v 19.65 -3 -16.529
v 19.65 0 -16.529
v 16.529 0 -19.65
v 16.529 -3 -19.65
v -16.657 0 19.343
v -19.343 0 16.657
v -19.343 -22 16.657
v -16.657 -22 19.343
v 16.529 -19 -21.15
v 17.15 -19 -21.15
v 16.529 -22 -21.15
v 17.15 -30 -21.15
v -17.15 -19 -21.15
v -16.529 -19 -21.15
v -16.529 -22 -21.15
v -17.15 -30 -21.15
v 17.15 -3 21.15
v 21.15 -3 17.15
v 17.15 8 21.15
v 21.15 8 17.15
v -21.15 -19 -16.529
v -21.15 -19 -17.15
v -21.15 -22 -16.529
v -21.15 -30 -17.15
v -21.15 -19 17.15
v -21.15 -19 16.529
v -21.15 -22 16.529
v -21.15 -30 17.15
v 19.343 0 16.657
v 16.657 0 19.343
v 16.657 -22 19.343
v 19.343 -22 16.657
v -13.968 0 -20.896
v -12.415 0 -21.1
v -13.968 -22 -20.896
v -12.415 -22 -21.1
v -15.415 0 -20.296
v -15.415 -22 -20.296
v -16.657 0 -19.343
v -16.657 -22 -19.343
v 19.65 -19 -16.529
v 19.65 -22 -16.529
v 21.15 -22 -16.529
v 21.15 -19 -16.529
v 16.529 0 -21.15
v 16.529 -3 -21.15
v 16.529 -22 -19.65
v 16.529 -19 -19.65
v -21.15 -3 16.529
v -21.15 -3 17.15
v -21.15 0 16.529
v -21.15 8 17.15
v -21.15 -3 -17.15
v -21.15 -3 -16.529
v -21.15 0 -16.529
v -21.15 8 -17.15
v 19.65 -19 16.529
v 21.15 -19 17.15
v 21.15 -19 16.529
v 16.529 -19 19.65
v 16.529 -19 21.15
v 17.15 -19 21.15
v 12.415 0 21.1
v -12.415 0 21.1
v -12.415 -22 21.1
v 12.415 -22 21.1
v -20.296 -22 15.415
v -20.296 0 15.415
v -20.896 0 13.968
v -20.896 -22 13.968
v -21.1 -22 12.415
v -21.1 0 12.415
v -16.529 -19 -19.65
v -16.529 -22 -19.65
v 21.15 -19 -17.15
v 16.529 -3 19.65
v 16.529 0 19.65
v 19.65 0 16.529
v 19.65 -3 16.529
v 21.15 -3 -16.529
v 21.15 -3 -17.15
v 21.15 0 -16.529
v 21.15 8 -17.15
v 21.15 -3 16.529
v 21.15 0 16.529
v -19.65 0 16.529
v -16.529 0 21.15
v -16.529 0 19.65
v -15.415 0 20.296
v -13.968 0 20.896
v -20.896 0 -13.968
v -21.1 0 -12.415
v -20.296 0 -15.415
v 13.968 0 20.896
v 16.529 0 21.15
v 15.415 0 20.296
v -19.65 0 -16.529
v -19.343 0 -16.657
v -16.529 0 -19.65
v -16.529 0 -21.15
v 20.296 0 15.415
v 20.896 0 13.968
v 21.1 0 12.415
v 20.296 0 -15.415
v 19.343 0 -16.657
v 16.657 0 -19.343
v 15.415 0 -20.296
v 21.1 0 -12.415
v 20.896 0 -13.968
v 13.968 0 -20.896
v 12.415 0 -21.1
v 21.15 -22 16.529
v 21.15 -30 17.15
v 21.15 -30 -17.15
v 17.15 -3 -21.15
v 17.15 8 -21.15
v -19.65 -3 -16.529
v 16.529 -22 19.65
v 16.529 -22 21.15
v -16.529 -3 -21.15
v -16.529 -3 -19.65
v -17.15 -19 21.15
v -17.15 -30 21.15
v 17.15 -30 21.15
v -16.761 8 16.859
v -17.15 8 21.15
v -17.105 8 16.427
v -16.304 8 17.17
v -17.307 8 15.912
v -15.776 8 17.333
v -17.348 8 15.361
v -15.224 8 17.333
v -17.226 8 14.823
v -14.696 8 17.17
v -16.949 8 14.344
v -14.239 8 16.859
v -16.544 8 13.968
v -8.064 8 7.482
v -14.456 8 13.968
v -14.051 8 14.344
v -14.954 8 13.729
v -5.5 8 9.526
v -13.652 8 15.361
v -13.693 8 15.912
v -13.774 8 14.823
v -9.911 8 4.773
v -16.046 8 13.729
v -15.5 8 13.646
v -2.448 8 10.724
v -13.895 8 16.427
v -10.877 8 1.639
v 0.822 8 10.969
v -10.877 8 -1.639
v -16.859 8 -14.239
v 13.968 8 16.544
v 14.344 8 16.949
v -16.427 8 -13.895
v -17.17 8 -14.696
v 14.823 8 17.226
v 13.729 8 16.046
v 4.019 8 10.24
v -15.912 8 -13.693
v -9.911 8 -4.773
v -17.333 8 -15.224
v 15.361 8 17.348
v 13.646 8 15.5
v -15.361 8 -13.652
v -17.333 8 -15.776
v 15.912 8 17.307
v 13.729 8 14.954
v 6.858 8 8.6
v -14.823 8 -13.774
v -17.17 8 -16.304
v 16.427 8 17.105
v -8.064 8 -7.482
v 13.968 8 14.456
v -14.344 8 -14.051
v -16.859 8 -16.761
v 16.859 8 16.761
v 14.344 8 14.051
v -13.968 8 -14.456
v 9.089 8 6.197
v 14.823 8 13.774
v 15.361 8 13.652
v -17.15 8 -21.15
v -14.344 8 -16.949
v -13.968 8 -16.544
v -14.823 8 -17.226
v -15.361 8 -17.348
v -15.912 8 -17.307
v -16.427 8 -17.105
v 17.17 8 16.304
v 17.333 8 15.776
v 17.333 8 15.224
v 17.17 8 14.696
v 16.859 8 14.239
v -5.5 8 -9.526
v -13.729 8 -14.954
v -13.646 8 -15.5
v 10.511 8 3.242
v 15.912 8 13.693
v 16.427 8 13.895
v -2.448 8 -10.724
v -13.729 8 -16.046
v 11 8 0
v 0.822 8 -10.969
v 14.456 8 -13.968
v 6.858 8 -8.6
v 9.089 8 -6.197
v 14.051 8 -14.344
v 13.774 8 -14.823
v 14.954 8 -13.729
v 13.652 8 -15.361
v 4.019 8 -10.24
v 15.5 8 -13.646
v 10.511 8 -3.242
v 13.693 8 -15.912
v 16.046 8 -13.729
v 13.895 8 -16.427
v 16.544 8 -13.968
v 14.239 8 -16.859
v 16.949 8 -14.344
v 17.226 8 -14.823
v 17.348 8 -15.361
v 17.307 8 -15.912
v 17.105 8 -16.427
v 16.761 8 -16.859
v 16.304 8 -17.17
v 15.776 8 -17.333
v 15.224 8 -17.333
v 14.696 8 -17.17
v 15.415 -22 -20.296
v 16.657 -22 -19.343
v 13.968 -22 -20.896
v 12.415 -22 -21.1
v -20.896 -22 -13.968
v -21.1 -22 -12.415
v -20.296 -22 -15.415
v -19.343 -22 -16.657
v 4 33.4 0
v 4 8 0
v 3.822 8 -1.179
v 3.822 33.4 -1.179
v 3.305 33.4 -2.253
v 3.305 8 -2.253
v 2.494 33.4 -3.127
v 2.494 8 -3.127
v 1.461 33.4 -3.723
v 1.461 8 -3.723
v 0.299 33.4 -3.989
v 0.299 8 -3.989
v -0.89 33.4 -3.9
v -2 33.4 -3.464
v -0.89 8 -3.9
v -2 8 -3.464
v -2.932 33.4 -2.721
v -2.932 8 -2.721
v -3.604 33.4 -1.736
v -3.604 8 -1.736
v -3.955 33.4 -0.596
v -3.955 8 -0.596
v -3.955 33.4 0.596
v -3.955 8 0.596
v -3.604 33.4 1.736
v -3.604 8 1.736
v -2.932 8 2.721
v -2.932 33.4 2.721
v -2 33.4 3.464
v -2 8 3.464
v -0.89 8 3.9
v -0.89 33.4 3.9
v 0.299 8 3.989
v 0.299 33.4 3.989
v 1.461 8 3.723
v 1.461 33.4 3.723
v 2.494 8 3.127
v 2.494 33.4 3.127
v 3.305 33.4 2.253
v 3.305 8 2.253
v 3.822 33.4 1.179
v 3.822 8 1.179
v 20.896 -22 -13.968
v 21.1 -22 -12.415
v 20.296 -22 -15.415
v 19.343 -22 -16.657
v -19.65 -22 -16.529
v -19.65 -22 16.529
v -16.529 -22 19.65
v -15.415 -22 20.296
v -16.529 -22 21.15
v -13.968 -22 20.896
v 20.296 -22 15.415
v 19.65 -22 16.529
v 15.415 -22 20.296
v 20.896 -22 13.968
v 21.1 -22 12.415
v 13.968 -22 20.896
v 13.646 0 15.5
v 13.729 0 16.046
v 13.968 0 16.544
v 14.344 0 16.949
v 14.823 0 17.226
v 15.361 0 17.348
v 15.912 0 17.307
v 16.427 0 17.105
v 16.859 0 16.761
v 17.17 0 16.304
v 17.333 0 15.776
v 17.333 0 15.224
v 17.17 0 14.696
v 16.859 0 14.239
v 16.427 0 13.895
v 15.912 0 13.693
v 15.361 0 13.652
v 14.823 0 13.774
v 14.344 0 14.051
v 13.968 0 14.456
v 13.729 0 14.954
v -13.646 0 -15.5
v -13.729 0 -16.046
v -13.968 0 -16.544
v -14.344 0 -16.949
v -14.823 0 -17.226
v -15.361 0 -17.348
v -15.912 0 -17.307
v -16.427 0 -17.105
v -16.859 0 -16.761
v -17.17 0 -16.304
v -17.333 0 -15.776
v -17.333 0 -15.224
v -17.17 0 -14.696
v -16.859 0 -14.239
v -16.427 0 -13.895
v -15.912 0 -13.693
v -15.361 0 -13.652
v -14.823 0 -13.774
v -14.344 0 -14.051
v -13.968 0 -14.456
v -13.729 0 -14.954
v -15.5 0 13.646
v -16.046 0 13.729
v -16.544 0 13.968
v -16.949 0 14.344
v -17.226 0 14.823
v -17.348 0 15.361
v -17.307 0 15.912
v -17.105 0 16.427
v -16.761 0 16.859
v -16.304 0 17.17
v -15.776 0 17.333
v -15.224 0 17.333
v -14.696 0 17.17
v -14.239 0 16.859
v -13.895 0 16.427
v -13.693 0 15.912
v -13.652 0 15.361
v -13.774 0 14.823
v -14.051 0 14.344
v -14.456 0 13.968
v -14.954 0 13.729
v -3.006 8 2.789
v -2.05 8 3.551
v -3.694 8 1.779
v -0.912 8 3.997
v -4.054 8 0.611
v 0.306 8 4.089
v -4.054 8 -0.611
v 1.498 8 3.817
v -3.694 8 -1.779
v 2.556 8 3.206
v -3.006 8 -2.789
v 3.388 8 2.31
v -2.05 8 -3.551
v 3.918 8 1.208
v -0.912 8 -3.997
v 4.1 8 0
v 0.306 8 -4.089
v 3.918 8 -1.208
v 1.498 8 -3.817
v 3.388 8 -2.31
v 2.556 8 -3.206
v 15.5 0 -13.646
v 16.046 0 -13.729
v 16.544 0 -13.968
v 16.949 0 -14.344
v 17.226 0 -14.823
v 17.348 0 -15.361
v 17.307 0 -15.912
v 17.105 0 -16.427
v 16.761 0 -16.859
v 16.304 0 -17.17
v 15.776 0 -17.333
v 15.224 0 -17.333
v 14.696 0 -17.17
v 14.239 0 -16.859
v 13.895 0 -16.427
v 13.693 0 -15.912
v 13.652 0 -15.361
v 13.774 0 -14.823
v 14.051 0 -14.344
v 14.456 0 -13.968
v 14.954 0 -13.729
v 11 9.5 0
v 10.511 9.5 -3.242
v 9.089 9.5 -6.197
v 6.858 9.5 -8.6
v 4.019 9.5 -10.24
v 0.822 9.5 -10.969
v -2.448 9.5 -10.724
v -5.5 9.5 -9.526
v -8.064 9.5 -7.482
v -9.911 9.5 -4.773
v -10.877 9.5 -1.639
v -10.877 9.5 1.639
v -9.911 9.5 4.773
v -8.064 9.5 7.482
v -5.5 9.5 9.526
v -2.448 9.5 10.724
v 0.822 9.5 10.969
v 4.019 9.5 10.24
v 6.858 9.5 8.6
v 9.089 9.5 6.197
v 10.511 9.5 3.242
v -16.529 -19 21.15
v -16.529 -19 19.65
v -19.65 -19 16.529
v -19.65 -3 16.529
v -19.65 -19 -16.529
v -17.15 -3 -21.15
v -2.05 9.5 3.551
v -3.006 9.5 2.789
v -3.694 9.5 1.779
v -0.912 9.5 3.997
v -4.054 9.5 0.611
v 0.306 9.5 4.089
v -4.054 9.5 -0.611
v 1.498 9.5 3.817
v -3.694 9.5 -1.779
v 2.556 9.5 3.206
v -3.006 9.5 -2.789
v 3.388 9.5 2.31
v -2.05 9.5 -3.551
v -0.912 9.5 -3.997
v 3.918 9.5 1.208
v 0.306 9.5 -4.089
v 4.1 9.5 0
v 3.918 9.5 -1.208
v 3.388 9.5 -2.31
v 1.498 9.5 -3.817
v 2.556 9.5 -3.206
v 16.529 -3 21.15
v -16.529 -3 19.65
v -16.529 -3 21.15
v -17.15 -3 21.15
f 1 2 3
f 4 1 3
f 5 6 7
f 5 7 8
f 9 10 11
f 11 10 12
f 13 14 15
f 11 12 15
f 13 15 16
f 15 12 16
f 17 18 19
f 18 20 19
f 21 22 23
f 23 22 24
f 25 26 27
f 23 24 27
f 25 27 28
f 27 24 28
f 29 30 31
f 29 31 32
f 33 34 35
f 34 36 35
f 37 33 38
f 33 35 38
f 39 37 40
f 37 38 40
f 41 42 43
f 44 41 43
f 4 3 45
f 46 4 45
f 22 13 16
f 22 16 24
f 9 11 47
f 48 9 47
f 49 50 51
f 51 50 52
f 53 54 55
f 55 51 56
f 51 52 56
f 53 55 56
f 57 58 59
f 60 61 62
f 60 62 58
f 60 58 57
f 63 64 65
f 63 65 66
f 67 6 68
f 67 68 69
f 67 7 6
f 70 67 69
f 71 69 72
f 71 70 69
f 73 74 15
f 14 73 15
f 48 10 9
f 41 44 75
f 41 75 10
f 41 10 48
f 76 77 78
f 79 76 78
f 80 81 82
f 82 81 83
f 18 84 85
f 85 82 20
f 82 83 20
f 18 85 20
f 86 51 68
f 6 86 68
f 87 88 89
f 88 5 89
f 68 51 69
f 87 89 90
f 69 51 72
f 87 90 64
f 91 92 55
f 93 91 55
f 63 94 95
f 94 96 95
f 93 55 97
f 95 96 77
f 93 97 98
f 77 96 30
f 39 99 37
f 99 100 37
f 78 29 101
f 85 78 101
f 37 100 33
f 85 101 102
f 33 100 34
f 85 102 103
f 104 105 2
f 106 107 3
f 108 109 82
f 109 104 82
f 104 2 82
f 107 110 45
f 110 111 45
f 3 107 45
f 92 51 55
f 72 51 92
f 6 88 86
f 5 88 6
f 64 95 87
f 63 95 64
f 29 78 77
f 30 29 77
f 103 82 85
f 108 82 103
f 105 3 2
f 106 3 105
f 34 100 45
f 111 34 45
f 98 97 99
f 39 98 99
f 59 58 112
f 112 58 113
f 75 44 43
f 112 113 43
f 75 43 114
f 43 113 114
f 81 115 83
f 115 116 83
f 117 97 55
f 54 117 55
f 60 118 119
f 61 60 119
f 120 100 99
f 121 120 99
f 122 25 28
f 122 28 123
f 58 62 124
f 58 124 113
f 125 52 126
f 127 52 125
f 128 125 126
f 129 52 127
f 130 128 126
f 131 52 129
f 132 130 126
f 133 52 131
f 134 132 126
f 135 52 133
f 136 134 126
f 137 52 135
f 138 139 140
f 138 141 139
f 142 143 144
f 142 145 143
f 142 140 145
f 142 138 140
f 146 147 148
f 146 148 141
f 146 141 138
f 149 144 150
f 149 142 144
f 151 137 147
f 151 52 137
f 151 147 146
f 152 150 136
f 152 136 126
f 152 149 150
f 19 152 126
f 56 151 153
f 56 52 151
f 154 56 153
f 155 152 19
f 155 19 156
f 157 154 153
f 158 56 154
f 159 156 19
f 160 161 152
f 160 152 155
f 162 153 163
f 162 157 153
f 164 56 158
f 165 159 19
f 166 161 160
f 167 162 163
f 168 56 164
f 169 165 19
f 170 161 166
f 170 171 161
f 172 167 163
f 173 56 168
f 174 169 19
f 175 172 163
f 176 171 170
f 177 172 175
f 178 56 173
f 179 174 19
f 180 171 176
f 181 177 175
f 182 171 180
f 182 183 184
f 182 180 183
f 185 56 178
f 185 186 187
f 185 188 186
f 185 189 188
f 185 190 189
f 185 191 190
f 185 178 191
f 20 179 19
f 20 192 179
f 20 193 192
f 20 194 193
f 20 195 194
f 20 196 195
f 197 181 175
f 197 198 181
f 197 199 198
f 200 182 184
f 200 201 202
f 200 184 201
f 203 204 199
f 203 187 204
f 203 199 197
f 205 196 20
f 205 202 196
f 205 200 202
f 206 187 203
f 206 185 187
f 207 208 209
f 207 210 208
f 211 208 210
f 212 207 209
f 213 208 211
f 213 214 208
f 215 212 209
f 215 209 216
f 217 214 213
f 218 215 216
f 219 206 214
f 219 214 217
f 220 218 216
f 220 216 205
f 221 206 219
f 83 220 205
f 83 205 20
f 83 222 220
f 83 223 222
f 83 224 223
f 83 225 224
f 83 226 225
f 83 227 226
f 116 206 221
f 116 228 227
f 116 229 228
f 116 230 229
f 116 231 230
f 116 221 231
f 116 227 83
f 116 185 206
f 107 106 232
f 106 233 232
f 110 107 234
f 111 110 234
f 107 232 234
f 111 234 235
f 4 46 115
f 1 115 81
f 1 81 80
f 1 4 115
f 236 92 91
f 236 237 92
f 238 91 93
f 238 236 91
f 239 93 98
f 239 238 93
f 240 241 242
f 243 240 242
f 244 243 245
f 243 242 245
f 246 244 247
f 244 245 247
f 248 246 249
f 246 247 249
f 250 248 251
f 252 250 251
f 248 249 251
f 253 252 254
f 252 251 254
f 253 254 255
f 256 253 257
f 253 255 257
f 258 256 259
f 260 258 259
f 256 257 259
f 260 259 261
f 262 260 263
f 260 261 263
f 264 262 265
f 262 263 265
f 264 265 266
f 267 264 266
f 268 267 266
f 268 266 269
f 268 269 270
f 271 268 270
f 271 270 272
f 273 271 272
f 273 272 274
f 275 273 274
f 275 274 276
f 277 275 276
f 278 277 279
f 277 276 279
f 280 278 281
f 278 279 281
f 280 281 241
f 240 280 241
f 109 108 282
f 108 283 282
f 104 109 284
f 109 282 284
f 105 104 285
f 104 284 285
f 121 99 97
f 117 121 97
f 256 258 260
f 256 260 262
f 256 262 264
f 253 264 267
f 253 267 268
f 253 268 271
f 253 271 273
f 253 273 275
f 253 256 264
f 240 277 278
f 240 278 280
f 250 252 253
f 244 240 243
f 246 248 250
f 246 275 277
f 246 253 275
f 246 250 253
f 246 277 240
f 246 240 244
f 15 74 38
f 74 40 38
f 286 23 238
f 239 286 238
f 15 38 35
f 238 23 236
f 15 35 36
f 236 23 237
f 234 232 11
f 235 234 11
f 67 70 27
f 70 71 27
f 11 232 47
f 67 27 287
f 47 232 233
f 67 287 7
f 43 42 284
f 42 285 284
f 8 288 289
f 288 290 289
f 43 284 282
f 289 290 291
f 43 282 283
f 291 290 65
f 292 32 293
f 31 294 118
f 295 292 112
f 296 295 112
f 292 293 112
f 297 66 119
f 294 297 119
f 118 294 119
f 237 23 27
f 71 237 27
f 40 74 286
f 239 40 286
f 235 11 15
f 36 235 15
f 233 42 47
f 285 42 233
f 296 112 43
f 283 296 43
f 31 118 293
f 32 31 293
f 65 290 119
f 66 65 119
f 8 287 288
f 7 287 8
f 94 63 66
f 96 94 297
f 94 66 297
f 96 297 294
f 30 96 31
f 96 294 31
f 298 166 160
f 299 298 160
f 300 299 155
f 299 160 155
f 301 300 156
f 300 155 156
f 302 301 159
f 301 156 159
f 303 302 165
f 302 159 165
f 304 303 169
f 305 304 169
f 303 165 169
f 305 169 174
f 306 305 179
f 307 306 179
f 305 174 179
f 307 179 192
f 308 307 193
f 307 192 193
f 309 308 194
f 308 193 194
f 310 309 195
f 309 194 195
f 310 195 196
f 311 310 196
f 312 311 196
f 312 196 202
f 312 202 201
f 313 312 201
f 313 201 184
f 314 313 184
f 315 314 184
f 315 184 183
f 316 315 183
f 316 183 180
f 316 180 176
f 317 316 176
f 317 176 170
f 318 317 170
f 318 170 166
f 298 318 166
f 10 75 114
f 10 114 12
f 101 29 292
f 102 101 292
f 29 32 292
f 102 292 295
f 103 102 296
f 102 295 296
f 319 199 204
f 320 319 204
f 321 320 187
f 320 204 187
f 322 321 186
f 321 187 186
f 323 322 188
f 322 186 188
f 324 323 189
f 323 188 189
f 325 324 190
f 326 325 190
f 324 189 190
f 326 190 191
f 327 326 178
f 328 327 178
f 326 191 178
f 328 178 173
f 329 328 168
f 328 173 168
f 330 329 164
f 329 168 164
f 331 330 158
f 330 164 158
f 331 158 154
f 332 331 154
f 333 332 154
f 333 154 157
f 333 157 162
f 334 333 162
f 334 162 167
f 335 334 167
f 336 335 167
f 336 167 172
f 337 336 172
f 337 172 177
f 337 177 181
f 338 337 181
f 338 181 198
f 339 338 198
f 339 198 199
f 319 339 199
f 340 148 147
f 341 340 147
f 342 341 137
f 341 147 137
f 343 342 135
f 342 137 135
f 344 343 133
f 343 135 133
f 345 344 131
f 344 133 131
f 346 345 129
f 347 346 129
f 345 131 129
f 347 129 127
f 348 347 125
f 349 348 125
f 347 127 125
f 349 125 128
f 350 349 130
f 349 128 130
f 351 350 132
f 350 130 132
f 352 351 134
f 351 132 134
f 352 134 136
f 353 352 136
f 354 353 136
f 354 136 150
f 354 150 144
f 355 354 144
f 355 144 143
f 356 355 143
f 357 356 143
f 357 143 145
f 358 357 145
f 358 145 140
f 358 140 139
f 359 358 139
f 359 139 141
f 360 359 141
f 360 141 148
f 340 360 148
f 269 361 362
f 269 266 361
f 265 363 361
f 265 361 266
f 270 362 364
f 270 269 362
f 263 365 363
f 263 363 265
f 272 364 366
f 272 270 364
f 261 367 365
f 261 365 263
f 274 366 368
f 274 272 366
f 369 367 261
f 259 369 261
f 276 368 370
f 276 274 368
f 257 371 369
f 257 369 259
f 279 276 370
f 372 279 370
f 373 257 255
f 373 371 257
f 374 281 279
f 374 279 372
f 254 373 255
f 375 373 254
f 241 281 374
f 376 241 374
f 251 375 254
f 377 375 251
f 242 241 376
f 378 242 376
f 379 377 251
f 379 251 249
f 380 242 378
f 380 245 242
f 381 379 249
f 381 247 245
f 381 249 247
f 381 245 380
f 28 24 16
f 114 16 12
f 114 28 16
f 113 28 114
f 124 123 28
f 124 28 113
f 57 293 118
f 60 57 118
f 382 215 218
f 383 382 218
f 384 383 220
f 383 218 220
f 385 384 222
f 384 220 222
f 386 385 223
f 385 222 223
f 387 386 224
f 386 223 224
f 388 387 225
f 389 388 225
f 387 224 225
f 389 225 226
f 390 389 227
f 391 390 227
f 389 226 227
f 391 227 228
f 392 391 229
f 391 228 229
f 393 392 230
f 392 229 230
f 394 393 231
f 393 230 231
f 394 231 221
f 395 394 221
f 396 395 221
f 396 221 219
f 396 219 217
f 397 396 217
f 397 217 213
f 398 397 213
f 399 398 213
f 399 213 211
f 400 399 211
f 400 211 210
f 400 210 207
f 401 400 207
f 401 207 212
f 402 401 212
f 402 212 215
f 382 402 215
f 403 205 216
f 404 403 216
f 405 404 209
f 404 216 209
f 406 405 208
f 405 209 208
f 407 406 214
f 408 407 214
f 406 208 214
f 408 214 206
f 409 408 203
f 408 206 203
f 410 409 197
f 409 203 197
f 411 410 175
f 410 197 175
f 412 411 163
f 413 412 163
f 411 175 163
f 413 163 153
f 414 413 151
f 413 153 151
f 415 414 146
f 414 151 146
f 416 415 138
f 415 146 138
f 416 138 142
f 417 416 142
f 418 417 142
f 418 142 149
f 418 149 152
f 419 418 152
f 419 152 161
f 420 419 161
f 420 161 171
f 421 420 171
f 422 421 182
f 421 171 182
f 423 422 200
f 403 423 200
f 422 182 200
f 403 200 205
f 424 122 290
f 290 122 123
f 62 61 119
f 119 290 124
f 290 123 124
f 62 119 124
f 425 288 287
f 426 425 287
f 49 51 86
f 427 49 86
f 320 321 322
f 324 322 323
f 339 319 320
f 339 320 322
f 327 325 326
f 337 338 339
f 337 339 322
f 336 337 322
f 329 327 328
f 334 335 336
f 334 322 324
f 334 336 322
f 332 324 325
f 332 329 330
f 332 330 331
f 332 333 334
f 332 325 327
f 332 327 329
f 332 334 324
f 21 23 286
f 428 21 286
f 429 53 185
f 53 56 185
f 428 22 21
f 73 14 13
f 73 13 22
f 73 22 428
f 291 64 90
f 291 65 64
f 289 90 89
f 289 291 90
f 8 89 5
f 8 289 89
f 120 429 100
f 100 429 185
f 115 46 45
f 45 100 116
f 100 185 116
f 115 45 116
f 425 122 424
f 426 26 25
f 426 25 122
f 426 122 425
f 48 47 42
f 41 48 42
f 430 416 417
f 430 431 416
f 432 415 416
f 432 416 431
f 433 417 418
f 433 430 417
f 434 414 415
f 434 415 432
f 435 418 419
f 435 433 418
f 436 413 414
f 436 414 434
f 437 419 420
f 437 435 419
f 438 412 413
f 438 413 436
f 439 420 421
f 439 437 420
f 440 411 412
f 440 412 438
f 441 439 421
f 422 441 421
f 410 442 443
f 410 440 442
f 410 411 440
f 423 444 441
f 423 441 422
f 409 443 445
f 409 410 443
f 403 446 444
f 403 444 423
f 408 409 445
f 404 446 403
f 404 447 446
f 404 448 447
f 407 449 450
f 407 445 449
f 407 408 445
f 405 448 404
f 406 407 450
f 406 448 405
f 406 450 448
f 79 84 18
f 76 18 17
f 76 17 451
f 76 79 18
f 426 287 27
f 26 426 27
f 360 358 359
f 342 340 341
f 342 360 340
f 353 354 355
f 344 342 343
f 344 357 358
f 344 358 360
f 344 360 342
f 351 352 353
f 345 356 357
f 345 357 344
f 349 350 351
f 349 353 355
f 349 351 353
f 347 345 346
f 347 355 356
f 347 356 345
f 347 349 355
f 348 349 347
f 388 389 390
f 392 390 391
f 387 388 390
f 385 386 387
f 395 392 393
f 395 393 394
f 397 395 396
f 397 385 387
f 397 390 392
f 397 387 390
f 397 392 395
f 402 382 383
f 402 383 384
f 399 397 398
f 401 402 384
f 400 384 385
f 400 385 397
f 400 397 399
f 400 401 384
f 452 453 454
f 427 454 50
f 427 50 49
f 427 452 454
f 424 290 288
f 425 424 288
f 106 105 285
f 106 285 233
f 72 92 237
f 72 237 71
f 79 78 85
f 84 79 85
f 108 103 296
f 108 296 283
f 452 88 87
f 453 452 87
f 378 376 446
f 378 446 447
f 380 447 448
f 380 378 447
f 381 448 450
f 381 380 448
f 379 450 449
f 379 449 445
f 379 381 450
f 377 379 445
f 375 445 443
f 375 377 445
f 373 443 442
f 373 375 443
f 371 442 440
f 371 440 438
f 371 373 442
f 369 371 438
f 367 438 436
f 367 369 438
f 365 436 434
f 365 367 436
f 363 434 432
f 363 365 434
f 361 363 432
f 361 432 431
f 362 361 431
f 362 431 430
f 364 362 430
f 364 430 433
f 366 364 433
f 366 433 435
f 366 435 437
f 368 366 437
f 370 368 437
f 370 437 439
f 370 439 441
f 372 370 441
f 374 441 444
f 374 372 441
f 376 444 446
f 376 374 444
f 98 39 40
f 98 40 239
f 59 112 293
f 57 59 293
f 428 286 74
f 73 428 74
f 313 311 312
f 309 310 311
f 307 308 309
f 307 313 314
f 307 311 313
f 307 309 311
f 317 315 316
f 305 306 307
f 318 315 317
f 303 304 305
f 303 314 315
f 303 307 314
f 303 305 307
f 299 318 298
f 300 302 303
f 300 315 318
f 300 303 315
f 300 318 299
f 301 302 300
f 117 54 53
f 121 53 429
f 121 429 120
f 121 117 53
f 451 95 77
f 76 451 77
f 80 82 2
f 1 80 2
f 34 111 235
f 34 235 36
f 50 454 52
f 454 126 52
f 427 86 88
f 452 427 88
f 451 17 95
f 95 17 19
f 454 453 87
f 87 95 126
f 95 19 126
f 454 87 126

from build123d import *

# Parameters (mm, degrees)
ESBO_O1_W              = 42.3
ESBO_O1_H              = 42.3
UPPERBODY_DEPTH        = 8
CHANFRO1_SIZE          = 4
ESBO_O2_R              = 11
ESBO_O2_R_2            = 4.1
LITTLETOPCIRCLE_DEPTH  = 1.5
ESBO_O3_R              = 1.853680608
MOUNTINGHOLES_DEPTH    = 25
PADR_OCIRCULAR1_COUNT  = 4
LITTLEMETALTABS_DEPTH  = 3
PADR_OCIRCULAR2_COUNT  = 4
MIDDLEBODY_DEPTH       = 22
FILETE1_R              = 6
ESBO_O9_W              = 42.3
ESBO_O9_H              = 42.3
BOTTOMBODY_DEPTH       = 8
CHANFRO5_SIZE          = 4
LITTLEMETALTABS2_DEPTH = 3
PADR_OCIRCULAR3_COUNT  = 4
ESBO_O4_R              = 4
BOSS_EXTRUDE1_DEPTH    = 25.4


with BuildPart() as part:
    # Esboço1 → UpperBody (new body)
    with BuildSketch(Plane(origin=(0, 0, 0), x_dir=(1, 0, 0), z_dir=(0, 1, 0))):
        Rectangle(ESBO_O1_W, ESBO_O1_H)
    extrude(amount=UPPERBODY_DEPTH)

    # Chanfro1
    chanfro1_edges = [part.edges().sort_by_distance(p)[0] for p in [
        (-21.15, 4, 21.15),
        (21.15, 4, -21.15),
        (-21.15, 4, -21.15),
        (21.15, 4, 21.15),
    ]]
    chamfer(chanfro1_edges, length=CHANFRO1_SIZE)

    # Esboço2 → LittleTopCircle (add)
    with BuildSketch(Plane(origin=(0, 8, 0), x_dir=(1, 0, 0), z_dir=(0, 1, 0))):
        Circle(ESBO_O2_R)
        Circle(ESBO_O2_R_2, mode=Mode.SUBTRACT)
    extrude(amount=LITTLETOPCIRCLE_DEPTH)

    # Esboço3 → MountingHoles (cut)
    with BuildSketch(Plane(origin=(0, 8, 0), x_dir=(1, 0, 0), z_dir=(0, 1, 0))):
        with Locations((-15.5, 15.5)):
            Circle(ESBO_O3_R)
    mountingholes = extrude(amount=-MOUNTINGHOLES_DEPTH, mode=Mode.SUBTRACT)

    # PadrãoCircular1: MountingHoles ×4 about axis
    padr_ocircular1_axis = Axis((0, 8, 0), (0, 1, 0))
    for i in range(1, PADR_OCIRCULAR1_COUNT):
        add(mountingholes.rotate(padr_ocircular1_axis, i * 360 / PADR_OCIRCULAR1_COUNT), mode=Mode.SUBTRACT)

    # Esboço7 → LittleMetalTabs (add)
    with BuildSketch(Plane.XZ):
        Polygon((-19.65, -16.528679656), (-21.15, -16.528679656), (-21.15, -17.15), (-17.15, -21.15), (-16.528679656, -21.15), (-16.528679656, -19.65), align=None)
    littlemetaltabs = extrude(amount=LITTLEMETALTABS_DEPTH)

    # PadrãoCircular2: LittleMetalTabs ×4 about axis
    padr_ocircular2_axis = Axis((0, 9.5, 0), (0, 1, 0))
    for i in range(1, PADR_OCIRCULAR2_COUNT):
        add(littlemetaltabs.rotate(padr_ocircular2_axis, i * 360 / PADR_OCIRCULAR2_COUNT))

    # Esboço8 → MiddleBody (add)
    with BuildSketch(Plane.XZ):
        Polygon((-14.9, 21.1), (14.9, 21.1), (21.1, 14.9), (21.1, -14.9), (14.9, -21.1), (-14.9, -21.1), (-21.1, -14.9), (-21.1, 14.9), align=None)
    extrude(amount=MIDDLEBODY_DEPTH)

    # Filete1
    filete1_edges = [part.edges().sort_by_distance(p)[0] for p in [
        (-21.1, -11, -14.9),
        (-21.1, -11, 14.9),
        (-14.9, -11, 21.1),
        (14.9, -11, 21.1),
        (-14.9, -11, -21.1),
        (21.1, -11, 14.9),
        (14.9, -11, -21.1),
        (21.1, -11, -14.9),
    ]]
    fillet(filete1_edges, radius=FILETE1_R)

    # Esboço9 → BottomBody (add)
    with BuildSketch(Plane.XZ.offset(22)):
        Rectangle(ESBO_O9_W, ESBO_O9_H)
    extrude(amount=BOTTOMBODY_DEPTH)

    # Chanfro5
    chanfro5_edges = [part.edges().sort_by_distance(p)[0] for p in [
        (21.15, -26, 21.15),
        (21.15, -26, -21.15),
        (-21.15, -26, 21.15),
        (-21.15, -26, -21.15),
    ]]
    chamfer(chanfro5_edges, length=CHANFRO5_SIZE)

    # Esboço10 → LittleMetalTabs2 (add)
    with BuildSketch(Plane(origin=(0, -22, 0), x_dir=(1, 0, 0), z_dir=(0, 1, 0))):
        Polygon((-16.528679656, -21.15), (-16.528679656, -19.65), (-19.65, -16.528679656), (-21.15, -16.528679656), (-21.15, -17.15), (-17.15, -21.15), align=None)
    littlemetaltabs2 = extrude(amount=LITTLEMETALTABS2_DEPTH)

    # PadrãoCircular3: LittleMetalTabs2 ×4 about axis
    padr_ocircular3_axis = Axis((0, -30, 0), (0, 1, 0))
    for i in range(1, PADR_OCIRCULAR3_COUNT):
        add(littlemetaltabs2.rotate(padr_ocircular3_axis, i * 360 / PADR_OCIRCULAR3_COUNT))

    # Esboço4 → Boss-Extrude1 (add)
    with BuildSketch(Plane(origin=(0, 8, 0), x_dir=(1, 0, 0), z_dir=(0, 1, 0))):
        Circle(ESBO_O4_R)
    extrude(amount=BOSS_EXTRUDE1_DEPTH)


solid = part.part
